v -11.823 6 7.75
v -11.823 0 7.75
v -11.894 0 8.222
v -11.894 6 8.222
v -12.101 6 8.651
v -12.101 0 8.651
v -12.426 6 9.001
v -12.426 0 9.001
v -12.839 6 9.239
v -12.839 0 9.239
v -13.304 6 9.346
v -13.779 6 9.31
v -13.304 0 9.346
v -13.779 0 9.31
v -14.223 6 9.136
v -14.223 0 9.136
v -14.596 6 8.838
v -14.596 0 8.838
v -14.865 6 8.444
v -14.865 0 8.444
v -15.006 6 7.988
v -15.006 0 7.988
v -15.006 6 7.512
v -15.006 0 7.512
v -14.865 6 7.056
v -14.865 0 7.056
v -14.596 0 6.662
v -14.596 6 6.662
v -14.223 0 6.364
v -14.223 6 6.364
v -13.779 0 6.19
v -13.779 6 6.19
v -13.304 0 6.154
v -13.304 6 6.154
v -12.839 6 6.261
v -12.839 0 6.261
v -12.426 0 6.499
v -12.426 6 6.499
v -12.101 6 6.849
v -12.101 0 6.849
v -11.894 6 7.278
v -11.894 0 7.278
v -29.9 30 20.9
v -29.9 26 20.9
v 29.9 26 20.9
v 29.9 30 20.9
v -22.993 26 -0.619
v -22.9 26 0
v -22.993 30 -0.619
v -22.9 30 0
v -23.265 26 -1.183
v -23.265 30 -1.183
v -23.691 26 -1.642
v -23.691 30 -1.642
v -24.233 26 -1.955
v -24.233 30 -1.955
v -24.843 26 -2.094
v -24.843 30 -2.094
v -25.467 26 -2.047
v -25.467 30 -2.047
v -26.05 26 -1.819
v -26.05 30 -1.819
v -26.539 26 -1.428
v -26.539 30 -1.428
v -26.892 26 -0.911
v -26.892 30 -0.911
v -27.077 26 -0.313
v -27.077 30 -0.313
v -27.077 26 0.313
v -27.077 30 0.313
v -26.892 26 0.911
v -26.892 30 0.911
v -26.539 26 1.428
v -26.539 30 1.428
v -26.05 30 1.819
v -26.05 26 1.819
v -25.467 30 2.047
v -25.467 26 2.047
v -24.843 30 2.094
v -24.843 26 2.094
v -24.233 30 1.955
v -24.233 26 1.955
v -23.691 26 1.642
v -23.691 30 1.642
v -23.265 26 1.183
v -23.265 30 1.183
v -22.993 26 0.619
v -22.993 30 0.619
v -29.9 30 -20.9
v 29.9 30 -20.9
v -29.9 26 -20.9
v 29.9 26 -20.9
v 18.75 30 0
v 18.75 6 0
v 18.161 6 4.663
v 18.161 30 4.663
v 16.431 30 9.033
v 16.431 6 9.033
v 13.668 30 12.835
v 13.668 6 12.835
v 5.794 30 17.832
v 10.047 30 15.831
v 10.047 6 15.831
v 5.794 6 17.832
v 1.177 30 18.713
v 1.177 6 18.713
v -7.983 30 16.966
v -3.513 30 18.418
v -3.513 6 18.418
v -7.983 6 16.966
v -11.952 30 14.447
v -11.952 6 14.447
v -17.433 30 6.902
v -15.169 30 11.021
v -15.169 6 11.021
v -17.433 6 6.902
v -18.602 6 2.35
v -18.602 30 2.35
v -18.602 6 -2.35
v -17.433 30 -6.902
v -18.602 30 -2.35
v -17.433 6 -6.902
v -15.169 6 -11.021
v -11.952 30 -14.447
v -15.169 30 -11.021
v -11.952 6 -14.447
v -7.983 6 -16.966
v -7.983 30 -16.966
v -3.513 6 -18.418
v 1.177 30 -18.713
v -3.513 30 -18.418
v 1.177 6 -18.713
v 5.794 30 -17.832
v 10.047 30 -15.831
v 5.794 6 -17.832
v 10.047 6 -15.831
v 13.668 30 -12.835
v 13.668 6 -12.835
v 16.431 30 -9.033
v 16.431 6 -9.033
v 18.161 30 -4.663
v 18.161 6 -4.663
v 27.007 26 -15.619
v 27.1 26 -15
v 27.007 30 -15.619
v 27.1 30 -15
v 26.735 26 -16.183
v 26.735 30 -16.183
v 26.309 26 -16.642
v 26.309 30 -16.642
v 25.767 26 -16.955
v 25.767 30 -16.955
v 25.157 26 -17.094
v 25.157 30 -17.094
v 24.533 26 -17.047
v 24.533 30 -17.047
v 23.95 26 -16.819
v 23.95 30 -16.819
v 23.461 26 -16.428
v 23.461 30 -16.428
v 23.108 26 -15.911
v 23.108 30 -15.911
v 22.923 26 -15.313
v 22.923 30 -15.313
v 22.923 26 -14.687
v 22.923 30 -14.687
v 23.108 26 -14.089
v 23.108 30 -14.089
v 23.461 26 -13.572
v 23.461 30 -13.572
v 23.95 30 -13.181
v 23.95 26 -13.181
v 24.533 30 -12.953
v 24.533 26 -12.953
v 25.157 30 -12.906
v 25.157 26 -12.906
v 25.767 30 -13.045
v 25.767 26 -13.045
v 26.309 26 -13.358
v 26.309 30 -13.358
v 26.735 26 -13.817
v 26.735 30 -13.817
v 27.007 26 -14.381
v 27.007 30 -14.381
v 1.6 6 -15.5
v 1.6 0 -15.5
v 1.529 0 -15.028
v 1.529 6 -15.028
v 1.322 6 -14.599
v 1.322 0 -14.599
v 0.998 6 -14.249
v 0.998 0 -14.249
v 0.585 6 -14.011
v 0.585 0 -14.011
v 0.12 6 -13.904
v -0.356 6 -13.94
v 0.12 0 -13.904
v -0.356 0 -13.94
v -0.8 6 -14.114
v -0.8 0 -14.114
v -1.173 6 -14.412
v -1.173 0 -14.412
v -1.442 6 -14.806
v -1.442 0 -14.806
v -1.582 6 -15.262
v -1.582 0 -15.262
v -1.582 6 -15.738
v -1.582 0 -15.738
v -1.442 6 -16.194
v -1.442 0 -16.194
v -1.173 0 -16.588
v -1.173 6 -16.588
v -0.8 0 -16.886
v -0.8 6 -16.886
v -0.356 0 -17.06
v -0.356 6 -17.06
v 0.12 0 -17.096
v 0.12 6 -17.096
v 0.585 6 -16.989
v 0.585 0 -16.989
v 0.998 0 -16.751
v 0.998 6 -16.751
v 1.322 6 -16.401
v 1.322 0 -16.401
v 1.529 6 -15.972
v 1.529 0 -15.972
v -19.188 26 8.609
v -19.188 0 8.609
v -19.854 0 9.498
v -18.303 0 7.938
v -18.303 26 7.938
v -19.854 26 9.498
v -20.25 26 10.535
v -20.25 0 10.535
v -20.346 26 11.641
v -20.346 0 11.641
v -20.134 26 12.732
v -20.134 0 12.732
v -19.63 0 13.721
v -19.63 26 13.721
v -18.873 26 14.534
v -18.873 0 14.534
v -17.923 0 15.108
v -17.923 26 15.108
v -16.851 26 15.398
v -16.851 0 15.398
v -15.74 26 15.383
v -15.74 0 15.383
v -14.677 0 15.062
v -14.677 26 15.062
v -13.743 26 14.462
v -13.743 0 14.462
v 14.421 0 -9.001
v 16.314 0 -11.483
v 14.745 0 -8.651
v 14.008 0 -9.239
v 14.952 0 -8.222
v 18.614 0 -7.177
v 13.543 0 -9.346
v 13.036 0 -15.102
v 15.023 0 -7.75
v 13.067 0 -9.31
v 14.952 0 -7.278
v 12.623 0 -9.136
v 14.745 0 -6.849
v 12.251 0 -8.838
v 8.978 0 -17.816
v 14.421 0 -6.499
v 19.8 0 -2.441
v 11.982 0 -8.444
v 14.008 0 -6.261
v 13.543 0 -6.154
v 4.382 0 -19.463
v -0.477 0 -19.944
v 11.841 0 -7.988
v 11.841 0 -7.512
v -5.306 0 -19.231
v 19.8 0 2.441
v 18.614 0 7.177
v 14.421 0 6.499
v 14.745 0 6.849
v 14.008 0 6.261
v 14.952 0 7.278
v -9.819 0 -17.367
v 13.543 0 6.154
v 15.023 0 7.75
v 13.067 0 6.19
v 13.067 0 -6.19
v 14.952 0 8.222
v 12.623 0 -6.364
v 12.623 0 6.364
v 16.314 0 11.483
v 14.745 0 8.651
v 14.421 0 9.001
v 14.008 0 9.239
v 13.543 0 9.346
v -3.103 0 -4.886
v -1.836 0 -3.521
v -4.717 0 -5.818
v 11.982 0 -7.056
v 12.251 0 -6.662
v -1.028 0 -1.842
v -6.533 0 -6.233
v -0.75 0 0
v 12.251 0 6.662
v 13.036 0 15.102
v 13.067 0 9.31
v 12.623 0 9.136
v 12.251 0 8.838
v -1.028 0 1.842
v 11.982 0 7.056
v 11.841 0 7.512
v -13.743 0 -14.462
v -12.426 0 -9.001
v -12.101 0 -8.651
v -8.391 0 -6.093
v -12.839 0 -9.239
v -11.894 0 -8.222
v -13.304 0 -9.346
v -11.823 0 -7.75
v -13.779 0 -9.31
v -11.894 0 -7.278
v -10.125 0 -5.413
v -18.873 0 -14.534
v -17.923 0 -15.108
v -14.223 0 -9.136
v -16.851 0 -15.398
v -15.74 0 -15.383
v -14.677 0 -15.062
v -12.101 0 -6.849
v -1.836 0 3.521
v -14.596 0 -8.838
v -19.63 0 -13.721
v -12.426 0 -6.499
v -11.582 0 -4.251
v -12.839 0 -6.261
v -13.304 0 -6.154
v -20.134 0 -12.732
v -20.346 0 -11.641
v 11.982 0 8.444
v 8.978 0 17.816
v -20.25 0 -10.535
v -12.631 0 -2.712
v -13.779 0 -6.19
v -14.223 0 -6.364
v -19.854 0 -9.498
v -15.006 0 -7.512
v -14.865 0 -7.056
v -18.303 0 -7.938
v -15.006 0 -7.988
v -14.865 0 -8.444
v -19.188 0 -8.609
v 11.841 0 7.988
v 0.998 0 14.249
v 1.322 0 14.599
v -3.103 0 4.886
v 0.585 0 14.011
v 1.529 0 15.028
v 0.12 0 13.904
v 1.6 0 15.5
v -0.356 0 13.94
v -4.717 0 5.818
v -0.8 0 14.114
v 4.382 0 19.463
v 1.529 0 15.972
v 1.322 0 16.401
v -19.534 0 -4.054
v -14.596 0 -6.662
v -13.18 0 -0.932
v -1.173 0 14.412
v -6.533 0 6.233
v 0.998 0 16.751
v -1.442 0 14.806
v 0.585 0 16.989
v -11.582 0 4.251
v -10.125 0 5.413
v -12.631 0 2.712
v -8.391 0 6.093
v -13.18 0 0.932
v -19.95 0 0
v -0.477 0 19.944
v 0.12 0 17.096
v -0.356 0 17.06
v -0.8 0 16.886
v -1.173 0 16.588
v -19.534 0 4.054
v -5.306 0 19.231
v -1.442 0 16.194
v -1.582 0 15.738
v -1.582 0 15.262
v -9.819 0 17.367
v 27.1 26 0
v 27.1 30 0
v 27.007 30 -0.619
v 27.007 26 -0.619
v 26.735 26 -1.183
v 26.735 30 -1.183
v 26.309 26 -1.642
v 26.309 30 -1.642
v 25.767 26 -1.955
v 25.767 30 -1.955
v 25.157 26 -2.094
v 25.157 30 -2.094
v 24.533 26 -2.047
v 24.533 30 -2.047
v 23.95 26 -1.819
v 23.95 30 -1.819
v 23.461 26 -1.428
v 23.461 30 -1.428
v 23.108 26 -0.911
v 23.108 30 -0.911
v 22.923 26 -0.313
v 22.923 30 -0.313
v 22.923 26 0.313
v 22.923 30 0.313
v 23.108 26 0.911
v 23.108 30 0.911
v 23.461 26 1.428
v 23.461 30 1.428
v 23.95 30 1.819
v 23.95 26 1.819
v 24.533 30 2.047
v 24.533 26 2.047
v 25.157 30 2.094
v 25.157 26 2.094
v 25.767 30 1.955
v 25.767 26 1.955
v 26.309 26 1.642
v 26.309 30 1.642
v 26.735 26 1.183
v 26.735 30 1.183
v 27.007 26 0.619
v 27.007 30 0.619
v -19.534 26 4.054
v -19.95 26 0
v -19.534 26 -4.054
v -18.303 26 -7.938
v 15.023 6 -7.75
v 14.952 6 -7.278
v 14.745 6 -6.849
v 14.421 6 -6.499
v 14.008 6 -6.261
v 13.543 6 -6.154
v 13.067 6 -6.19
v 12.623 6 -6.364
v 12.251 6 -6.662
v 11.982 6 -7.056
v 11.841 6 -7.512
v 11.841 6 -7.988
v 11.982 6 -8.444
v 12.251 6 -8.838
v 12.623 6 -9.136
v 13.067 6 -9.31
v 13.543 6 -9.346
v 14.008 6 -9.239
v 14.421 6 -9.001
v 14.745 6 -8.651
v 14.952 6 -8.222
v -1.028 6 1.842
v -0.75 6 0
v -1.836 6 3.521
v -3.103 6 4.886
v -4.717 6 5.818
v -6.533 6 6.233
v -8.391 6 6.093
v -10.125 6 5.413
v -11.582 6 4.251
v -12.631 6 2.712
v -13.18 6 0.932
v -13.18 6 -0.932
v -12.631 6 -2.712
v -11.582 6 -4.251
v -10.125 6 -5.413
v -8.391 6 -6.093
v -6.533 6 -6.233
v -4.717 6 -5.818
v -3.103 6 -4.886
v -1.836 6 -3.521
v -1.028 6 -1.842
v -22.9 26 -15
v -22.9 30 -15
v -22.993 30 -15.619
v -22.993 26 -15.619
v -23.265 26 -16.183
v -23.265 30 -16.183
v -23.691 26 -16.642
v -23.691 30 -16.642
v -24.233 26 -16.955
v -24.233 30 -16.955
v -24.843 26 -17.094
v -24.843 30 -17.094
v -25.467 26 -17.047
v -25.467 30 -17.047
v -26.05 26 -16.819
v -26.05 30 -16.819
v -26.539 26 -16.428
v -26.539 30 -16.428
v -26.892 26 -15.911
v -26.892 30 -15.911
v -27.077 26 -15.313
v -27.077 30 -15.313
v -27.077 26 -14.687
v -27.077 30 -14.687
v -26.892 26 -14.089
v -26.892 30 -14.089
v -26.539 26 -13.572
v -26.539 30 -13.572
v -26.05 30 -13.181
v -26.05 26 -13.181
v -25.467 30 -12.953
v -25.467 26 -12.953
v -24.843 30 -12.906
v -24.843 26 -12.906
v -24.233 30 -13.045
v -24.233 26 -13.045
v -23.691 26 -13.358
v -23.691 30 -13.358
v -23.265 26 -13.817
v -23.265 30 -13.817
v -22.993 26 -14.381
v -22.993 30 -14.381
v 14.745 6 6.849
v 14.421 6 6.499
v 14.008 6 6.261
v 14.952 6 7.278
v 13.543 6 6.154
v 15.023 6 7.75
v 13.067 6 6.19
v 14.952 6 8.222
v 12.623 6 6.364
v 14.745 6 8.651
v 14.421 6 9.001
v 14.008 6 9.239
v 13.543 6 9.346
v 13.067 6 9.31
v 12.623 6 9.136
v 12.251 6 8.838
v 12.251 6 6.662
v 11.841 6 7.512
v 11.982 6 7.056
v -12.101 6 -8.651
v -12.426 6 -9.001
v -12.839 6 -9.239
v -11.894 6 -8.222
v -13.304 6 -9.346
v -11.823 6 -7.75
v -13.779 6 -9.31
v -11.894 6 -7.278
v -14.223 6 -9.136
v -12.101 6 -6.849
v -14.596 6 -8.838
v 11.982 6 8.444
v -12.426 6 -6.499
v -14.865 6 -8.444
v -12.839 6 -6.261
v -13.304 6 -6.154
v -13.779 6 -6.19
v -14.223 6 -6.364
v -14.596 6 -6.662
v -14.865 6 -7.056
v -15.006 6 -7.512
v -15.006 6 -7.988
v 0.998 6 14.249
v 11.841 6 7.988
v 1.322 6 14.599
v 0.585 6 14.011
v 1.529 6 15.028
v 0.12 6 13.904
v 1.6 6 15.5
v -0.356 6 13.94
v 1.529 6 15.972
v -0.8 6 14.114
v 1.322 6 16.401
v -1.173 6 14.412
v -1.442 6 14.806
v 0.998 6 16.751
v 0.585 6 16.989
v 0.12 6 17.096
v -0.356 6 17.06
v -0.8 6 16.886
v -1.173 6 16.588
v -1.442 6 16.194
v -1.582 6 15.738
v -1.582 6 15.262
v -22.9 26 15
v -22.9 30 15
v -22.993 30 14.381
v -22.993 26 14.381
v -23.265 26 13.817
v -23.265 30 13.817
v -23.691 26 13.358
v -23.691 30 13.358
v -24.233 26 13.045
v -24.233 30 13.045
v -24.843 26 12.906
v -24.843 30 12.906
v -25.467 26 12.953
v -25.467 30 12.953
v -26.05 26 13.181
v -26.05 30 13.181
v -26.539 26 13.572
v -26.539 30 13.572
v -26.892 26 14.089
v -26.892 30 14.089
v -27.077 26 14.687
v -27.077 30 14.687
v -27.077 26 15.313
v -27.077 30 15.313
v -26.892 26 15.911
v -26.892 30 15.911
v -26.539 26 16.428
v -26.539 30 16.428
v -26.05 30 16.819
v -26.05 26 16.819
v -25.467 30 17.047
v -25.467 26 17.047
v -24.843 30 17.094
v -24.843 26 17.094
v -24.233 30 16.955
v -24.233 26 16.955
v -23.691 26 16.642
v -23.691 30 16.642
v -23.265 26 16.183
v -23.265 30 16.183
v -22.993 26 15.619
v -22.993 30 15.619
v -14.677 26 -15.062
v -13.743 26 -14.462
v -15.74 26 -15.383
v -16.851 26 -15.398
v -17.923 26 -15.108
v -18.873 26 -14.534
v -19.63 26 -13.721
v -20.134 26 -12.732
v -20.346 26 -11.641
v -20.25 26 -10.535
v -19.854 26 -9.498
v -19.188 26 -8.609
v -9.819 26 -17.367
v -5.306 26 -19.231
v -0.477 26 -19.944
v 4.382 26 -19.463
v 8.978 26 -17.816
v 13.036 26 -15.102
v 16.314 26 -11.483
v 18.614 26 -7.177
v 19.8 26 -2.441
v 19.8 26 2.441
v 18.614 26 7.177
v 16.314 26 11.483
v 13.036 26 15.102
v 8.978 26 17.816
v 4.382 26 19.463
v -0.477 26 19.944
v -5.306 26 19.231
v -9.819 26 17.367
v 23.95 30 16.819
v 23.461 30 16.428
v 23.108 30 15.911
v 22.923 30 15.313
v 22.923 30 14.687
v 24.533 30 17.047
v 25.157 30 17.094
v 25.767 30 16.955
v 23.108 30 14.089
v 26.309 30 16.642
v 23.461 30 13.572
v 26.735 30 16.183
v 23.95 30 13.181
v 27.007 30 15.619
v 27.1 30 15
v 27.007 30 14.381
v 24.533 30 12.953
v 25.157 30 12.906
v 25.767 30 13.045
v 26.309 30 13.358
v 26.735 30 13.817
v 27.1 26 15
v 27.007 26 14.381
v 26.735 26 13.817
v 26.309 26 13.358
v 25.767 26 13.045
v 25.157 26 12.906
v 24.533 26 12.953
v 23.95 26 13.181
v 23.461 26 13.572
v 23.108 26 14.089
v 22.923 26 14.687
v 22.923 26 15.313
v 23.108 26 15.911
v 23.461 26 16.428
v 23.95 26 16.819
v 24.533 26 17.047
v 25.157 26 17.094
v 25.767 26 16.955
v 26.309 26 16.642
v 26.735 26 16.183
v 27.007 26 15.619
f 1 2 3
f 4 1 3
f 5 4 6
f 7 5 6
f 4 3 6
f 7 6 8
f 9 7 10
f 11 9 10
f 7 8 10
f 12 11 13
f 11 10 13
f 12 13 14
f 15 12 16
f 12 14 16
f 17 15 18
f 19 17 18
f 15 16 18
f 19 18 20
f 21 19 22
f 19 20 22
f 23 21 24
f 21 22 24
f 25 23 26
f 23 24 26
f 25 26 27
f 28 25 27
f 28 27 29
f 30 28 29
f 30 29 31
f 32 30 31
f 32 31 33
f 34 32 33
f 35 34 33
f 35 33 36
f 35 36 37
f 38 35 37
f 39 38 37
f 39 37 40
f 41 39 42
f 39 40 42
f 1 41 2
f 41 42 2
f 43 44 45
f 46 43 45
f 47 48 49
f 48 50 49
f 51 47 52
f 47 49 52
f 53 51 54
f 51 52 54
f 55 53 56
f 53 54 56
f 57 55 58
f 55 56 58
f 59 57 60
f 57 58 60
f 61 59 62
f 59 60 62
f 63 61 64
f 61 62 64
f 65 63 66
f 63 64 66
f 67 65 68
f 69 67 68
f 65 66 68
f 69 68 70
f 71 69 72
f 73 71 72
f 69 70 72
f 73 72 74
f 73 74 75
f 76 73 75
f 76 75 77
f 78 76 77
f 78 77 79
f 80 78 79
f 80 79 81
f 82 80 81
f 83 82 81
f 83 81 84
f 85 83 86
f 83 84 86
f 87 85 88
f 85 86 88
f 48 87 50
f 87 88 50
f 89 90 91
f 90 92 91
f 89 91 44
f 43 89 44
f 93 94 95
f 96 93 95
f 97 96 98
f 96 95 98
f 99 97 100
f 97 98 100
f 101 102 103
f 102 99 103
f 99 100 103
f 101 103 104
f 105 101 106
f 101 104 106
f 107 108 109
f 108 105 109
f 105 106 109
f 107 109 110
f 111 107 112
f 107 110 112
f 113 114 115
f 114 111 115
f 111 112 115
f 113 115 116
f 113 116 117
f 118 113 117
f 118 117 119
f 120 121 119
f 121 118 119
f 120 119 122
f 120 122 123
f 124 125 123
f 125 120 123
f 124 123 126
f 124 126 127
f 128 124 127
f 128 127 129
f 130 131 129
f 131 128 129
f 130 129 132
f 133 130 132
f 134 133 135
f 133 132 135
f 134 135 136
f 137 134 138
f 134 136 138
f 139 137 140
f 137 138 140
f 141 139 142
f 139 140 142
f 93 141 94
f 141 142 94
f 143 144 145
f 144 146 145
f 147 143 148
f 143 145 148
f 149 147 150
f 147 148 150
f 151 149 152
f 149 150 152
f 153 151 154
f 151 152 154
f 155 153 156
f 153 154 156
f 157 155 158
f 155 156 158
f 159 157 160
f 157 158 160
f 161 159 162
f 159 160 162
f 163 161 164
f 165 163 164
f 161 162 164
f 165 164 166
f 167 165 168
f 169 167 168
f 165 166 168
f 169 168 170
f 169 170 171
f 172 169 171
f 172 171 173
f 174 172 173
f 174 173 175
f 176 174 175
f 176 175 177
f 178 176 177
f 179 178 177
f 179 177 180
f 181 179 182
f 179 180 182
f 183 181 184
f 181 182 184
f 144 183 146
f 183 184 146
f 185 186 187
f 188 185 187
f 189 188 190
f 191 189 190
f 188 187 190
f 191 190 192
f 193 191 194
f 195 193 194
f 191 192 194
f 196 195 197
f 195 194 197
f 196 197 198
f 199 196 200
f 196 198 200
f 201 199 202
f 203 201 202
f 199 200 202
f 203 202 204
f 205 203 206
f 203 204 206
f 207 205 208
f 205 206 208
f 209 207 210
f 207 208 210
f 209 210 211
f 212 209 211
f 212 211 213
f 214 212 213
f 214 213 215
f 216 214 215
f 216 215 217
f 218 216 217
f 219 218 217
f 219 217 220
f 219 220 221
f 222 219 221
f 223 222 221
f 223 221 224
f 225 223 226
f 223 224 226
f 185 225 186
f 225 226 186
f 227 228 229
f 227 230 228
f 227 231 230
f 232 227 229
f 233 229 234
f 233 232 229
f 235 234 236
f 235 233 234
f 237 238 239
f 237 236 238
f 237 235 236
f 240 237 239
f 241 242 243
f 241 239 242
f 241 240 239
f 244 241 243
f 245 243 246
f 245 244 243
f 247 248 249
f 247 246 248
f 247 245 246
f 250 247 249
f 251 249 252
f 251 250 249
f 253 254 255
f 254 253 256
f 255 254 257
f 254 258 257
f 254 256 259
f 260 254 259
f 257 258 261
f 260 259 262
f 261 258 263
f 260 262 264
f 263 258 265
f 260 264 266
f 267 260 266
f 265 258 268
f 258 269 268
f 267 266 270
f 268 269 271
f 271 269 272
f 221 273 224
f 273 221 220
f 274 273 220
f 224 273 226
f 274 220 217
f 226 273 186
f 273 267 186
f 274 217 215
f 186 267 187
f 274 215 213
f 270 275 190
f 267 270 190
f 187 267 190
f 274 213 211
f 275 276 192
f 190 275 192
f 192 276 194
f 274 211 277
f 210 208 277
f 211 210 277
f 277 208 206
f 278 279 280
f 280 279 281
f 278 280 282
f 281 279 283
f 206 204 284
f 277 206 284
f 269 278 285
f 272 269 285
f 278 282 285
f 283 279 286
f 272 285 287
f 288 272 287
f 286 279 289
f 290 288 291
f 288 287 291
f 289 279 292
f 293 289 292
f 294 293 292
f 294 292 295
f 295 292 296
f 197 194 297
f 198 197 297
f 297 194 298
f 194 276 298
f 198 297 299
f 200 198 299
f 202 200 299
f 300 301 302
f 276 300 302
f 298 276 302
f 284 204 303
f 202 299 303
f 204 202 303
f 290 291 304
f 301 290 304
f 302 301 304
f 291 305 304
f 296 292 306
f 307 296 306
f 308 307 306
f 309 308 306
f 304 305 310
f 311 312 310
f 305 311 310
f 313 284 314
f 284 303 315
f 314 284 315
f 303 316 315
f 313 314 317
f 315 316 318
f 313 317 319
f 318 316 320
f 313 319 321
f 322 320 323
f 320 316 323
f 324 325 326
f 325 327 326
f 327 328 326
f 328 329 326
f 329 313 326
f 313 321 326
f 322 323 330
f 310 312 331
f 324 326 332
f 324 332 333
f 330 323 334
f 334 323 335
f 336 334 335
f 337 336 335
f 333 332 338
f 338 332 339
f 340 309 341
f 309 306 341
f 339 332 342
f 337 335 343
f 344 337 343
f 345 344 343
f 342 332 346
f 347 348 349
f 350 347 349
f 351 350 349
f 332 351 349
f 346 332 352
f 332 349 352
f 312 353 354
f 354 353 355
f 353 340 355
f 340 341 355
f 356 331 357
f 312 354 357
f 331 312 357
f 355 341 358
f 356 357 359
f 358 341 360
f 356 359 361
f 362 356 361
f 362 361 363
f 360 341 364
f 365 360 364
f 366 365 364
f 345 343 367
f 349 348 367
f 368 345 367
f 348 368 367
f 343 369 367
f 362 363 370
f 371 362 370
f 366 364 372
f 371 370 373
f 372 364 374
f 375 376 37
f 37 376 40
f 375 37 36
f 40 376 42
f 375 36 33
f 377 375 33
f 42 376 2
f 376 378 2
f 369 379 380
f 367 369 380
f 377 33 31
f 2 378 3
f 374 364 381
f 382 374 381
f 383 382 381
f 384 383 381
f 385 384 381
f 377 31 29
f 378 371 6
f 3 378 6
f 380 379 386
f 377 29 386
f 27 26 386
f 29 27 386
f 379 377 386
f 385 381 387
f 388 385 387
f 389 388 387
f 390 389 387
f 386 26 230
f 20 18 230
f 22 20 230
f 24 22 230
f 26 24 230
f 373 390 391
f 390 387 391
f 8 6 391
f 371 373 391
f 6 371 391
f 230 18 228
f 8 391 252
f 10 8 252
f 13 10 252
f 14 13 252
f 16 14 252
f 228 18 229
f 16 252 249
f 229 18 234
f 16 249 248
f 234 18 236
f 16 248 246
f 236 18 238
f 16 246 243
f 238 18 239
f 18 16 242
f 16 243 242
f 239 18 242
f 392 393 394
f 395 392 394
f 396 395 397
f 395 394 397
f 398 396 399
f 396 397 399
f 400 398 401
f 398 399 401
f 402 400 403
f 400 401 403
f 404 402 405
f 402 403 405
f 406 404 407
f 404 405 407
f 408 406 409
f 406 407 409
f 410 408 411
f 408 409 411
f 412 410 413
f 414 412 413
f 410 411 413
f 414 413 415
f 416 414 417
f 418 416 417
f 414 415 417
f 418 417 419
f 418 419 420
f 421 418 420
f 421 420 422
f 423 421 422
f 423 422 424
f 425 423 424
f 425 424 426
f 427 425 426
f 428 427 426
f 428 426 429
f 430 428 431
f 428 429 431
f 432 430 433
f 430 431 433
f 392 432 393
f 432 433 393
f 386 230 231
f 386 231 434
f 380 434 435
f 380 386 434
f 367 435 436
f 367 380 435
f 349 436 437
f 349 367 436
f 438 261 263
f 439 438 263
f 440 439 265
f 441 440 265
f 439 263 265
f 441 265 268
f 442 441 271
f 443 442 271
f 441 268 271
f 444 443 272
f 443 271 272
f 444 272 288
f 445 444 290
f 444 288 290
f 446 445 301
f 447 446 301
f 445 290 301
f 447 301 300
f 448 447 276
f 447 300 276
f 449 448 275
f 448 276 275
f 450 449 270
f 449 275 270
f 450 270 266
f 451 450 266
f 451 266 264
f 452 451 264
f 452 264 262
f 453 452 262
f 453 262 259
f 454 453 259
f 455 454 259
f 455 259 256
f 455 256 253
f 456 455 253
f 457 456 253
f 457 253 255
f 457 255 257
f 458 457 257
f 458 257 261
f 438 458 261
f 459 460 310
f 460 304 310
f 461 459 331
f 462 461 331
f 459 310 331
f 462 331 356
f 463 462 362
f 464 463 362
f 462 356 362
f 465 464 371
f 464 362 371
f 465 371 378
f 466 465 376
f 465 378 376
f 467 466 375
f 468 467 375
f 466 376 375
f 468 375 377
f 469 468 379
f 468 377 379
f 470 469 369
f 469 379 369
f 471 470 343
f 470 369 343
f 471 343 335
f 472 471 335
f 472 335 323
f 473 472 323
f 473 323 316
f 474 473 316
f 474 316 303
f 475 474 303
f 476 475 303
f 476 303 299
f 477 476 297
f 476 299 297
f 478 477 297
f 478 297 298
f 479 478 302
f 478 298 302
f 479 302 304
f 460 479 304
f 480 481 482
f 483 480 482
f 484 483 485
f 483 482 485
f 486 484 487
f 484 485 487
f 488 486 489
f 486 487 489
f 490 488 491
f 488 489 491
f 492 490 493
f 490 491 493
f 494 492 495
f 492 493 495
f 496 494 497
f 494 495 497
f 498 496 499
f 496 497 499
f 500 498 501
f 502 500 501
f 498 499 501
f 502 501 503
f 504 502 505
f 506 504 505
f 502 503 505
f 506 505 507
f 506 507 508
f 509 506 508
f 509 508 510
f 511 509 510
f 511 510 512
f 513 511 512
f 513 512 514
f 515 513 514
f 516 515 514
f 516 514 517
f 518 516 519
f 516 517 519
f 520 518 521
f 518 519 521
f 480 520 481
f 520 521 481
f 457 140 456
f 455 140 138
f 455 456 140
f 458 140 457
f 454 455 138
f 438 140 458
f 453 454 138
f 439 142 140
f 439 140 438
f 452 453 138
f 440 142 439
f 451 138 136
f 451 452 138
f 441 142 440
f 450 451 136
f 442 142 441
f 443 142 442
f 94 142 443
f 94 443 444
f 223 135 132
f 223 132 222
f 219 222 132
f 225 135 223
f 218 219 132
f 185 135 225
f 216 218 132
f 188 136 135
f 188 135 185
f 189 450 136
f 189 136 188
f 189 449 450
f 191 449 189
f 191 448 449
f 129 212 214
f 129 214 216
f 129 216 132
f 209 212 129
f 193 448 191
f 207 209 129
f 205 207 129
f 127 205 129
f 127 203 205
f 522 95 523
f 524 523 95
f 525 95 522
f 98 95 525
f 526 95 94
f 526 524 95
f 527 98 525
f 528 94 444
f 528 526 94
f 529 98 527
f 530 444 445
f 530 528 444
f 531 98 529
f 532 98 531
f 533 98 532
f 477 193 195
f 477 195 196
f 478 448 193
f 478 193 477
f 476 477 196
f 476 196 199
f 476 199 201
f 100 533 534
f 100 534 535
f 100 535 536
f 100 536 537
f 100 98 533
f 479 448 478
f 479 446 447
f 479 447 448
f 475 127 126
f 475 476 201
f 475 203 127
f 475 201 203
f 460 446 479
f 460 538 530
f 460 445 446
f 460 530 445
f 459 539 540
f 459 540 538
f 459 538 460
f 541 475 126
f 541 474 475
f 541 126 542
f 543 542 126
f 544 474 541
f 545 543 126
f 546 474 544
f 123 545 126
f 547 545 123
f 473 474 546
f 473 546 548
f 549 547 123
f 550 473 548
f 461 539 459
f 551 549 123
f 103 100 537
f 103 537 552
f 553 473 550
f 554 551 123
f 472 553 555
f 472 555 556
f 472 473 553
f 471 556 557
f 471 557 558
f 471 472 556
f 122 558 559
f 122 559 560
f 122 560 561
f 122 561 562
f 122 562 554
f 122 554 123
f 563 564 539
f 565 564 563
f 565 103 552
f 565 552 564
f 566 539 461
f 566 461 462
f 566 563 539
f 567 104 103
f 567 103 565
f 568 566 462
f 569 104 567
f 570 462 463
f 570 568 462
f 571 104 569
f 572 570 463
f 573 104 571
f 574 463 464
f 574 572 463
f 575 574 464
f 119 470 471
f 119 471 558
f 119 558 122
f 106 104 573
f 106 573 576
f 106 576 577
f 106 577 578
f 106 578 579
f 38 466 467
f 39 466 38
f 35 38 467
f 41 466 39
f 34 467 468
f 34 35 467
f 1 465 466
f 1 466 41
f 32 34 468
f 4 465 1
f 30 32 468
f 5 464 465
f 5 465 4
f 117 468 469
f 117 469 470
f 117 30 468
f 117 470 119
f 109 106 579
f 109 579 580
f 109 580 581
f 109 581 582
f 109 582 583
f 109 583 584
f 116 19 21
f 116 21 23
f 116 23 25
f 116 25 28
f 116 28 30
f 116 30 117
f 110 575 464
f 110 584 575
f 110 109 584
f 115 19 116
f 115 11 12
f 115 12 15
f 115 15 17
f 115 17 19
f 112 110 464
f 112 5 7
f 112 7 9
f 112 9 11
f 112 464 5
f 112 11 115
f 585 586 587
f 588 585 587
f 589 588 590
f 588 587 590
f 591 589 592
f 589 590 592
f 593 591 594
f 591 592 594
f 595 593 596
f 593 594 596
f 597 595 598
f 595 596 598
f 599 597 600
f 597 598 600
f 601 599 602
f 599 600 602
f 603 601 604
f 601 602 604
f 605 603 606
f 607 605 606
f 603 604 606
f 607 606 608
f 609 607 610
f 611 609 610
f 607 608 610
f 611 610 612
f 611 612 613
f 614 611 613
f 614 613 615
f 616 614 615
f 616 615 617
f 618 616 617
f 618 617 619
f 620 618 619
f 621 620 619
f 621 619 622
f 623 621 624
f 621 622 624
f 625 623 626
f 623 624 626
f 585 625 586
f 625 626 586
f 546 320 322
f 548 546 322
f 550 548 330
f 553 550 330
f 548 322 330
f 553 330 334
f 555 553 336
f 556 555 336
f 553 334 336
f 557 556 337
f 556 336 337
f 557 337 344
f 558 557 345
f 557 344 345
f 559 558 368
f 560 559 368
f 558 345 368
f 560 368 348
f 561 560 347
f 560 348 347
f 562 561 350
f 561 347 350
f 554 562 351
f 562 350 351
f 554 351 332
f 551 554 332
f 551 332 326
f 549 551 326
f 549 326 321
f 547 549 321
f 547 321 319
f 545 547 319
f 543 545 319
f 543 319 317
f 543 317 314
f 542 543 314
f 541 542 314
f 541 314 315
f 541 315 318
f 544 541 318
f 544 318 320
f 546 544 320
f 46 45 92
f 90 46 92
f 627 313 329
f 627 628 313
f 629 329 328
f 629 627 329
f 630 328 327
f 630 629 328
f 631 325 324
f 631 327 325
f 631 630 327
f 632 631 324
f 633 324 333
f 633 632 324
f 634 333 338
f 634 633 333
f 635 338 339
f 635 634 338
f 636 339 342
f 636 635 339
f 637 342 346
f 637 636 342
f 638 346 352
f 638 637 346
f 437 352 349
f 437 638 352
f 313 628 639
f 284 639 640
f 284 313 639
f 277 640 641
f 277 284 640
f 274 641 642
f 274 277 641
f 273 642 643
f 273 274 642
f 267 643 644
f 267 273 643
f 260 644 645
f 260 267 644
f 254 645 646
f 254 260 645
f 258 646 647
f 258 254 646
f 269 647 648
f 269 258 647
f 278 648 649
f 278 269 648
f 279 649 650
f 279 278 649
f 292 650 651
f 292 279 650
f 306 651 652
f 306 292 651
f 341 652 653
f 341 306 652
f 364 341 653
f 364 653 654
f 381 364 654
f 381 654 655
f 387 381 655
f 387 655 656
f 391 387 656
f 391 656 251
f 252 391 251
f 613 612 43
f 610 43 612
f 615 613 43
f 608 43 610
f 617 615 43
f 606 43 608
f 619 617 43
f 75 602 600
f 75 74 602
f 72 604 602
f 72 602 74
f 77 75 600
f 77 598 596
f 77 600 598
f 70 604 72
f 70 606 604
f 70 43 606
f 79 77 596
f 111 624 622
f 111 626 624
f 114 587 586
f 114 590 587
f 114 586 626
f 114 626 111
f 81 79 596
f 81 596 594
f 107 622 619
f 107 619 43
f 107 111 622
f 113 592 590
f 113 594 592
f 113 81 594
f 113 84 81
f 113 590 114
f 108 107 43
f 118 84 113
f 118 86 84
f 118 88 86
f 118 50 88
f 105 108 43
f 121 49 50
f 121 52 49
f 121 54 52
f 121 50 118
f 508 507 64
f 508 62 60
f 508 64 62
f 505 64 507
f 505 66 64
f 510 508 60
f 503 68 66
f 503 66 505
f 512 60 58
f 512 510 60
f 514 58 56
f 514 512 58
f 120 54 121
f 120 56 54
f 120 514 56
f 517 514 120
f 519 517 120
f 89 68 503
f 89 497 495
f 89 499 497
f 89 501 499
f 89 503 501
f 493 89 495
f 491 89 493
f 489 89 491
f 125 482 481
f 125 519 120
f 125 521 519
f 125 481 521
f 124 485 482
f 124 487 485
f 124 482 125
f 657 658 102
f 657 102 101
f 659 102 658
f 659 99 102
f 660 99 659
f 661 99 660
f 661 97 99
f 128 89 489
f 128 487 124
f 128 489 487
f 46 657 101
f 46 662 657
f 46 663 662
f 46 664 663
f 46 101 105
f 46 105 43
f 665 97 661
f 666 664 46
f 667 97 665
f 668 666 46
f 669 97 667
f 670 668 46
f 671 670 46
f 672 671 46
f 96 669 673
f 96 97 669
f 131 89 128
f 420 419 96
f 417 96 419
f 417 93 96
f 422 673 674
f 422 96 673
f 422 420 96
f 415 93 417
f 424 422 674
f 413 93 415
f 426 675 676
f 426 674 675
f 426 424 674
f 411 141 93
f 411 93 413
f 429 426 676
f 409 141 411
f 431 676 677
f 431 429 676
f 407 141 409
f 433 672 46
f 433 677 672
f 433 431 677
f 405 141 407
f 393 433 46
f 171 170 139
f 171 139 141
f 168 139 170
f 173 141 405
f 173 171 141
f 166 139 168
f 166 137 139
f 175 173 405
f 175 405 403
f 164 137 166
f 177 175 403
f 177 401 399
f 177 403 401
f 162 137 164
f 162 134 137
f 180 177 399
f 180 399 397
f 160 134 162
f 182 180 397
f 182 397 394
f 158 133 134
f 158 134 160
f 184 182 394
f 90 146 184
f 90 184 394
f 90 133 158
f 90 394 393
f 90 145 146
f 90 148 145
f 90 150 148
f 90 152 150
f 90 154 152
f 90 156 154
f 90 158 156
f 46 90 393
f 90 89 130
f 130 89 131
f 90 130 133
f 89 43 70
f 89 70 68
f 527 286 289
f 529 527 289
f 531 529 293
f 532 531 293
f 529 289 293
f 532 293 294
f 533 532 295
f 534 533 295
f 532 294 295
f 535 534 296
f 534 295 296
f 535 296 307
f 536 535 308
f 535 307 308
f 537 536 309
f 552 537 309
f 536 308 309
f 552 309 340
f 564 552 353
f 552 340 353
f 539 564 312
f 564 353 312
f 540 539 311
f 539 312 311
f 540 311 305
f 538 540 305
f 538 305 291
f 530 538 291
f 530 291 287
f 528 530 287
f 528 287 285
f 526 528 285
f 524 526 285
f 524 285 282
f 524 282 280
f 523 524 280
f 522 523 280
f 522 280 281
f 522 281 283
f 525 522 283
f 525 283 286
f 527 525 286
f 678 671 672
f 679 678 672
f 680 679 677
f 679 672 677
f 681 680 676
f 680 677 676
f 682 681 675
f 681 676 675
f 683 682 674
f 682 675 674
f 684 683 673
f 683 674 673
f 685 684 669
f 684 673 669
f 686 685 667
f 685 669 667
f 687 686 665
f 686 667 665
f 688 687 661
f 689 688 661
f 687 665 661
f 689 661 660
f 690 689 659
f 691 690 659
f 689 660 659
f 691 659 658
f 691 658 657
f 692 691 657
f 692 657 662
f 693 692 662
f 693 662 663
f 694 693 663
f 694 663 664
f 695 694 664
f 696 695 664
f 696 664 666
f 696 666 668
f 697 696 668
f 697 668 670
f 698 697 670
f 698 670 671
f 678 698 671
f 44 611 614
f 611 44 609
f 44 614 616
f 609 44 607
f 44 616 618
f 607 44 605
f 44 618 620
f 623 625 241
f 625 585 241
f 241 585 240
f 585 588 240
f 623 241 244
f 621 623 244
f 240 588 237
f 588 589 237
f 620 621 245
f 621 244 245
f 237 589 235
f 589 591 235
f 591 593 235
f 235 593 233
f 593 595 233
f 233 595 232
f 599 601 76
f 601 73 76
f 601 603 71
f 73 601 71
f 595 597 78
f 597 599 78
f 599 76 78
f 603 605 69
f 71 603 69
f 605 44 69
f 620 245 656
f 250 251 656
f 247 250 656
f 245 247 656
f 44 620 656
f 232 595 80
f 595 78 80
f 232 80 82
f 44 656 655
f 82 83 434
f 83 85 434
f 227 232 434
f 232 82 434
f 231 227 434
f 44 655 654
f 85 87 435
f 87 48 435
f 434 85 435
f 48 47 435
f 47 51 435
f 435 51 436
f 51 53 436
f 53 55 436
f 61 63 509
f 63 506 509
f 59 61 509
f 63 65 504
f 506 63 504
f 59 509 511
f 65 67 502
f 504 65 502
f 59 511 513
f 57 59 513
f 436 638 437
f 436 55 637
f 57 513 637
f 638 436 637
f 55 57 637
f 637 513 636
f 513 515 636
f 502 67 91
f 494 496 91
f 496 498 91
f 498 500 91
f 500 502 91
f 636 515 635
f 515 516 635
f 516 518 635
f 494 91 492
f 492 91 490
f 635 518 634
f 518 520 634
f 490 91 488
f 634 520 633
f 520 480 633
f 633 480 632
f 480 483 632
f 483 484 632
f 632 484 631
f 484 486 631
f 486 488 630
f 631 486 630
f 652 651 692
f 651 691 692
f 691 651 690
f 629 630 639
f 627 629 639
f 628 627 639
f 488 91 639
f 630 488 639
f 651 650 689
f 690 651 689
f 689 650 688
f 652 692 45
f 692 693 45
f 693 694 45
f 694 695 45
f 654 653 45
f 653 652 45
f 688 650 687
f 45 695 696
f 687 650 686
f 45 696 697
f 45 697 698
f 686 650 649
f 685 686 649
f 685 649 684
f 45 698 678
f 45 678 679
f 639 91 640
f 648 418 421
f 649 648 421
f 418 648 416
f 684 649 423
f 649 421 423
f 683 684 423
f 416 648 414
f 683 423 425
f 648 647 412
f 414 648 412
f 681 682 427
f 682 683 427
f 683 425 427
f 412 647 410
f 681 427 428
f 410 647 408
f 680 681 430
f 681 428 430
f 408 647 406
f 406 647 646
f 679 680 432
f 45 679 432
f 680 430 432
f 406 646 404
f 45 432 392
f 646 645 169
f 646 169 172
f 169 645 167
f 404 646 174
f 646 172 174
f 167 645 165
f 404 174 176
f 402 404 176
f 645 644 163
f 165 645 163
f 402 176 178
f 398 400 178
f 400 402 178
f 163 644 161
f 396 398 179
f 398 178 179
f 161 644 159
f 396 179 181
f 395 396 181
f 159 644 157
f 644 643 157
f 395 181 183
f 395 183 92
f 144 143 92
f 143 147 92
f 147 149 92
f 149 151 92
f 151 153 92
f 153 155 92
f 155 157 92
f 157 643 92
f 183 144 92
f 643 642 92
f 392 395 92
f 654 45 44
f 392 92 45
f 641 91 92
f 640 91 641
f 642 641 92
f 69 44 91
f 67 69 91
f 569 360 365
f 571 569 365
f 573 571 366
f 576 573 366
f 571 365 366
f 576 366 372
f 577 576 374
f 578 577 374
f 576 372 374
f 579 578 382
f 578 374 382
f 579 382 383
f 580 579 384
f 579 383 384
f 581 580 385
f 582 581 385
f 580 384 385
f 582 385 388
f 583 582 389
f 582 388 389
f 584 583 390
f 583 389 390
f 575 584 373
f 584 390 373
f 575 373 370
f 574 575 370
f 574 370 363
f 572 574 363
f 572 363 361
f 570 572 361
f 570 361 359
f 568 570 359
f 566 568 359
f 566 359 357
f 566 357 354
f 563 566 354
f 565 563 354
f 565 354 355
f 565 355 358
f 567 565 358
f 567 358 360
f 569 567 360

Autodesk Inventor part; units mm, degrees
ref_plane "YZ Plane" through (0, 0, 0) normal (1, 0, 0) x (0, 1, 0)
ref_plane "XZ Plane" through (0, 0, 0) normal (0, 1, 0) x (-1, 0, 0)
ref_plane "XY Plane" through (0, 0, 0) normal (0, 0, 1) x (1, 0, 0)
sketch "Sketch1" plane through (0, 0, 0) normal (0, 1, 0) x (-1, 0, 0)
  circle A0 centre (0, 0) radius 19.95
  dimension "d0" = 39.9
extrude "Extrusion1" add sketch "Sketch1" along normal blind 6
sketch "Sketch2" plane through (0, 6, 0) normal (0, 1, 0) x (1, 0, 0)
  circle A0 centre (0, 0) radius 19.95
  circle A1 centre (0, 0) radius 18.75
  dimension "d3" = 37.5
  dimension "d4" = 39.9
extrude "Extrusion2" add sketch "Sketch2" along normal blind 20
sketch "Sketch3" plane through (0, 0, 0) normal (0, -1, 0) x (1, 0, 0)
  circle A0 centre (-7, 0) radius 6.25
  circle A1 centre (0, -15.5) radius 1.6
  circle A2 centre (13.4234, -7.75) radius 1.6
  circle A3 centre (13.4234, 7.75) radius 1.6
  circle A4 centre (0, 15.5) radius 1.6
  circle A5 centre (-13.4234, 7.75) radius 1.6
  circle A6 centre (-13.4234, -7.75) radius 1.6
  point P0 (0, 0)
  dimension "d7" = 0
  dimension "d8" = 7
  dimension "d9" = 12.5
  dimension "d10" = 3.2
  dimension "d11" = 0
  dimension "d12" = 15.5
  dimension "d15" = 360
extrude "Extrusion3" cut sketch "Sketch3" against normal up to next
sketch "Sketch4" plane through (0, 26, 0) normal (0, 1, 0) x (1, 0, 0)
  circle A0 centre (0, 0) radius 18.75 projected
  line L0 (-29.9, -20.9) -> (29.9, -20.9)
  line L1 (29.9, -20.9) -> (29.9, 20.9)
  line L2 (29.9, 20.9) -> (-29.9, 20.9)
  line L3 (-29.9, 20.9) -> (-29.9, -20.9)
  line L4 (-29.9, -20.9) -> (29.9, 20.9) construction
  line L5 (29.9, -20.9) -> (-29.9, 20.9) construction
  dimension "d19" = 59.8
  dimension "d20" = 41.8
extrude "Extrusion4" add sketch "Sketch4" along normal blind 4
sketch "Sketch5" plane through (0, 30, 0) normal (0, 1, 0) x (1, 0, 0)
  line L0 (29.9, -20.9) -> (29.9, 20.9) projected
  line L1 (-29.9, 20.9) -> (-29.9, -20.9) projected
  circle A0 centre (25, 15) radius 2.1
  circle A1 centre (25, 0) radius 2.1
  circle A2 centre (25, -15) radius 2.1
  circle A3 centre (-25, 15) radius 2.1
  circle A4 centre (-25, 0) radius 2.1
  circle A5 centre (-25, -15) radius 2.1
  point P0 (0, 0)
  dimension "d23" = 0
  dimension "d24" = 25
  dimension "d25" = 15
  dimension "d26" = 25
  dimension "d27" = 25
  dimension "d28" = 15
  dimension "d29" = 4.2
  dimension "d30" = 4.2
  dimension "d31" = 4.2
  dimension "d33" = 0
  dimension "d34" = 15
  dimension "d35" = 15
  dimension "d36" = 25
  dimension "d37" = 25
  dimension "d38" = 25
  dimension "d39" = 4.2
  dimension "d40" = 4.2
  dimension "d41" = 4.2
extrude "Extrusion5" cut sketch "Sketch5" against normal up to next
sketch "Sketch7" plane through (0, 26, 0) normal (0, -1, 0) x (1, 0, 0)
  line L0 (29.9, -20.9) -> (-29.9, -20.9) projected
  line L1 (14.3023, -9.9973) -> (16.3514, -11.4296)
  line L2 (-29.9, 20.9) -> (29.9, 20.9) projected
  line L3 (14.3023, 9.9973) -> (16.3514, 11.4296)
  circle A0 centre (0, 0) radius 19.95 projected
  arc A1 (18.3028, 7.9379) -> (13.7426, 14.4618) centre (16.3514, 11.4296) ccw
  arc A2 (13.7426, -14.4618) -> (18.3028, -7.9379) centre (16.3514, -11.4296) ccw
  arc A3 (-13.7426, 14.4618) -> (-18.3028, 7.9379) centre (-16.3514, 11.4296) ccw
  arc A4 (-18.3028, -7.9379) -> (-13.7426, -14.4618) centre (-16.3514, -11.4296) ccw
  line L4 (-16.3514, 11.4296) -> (-14.3023, 9.9973)
  line L5 (-14.3023, -9.9973) -> (-16.3514, -11.4296)
  dimension "d48" = 8
  dimension "d49" = 8
  dimension "d50" = 8
  dimension "d51" = 8
  dimension "d52" = 32.7028
  dimension "d53" = 32.7028
  dimension "d54" = 22.8591
extrude "Extrusion8" add sketch "Sketch7" along normal blind 26 contours A0 A3 | A4 A0
properties part number "motorHolder57mmVer2" material "ABS Plastic"
